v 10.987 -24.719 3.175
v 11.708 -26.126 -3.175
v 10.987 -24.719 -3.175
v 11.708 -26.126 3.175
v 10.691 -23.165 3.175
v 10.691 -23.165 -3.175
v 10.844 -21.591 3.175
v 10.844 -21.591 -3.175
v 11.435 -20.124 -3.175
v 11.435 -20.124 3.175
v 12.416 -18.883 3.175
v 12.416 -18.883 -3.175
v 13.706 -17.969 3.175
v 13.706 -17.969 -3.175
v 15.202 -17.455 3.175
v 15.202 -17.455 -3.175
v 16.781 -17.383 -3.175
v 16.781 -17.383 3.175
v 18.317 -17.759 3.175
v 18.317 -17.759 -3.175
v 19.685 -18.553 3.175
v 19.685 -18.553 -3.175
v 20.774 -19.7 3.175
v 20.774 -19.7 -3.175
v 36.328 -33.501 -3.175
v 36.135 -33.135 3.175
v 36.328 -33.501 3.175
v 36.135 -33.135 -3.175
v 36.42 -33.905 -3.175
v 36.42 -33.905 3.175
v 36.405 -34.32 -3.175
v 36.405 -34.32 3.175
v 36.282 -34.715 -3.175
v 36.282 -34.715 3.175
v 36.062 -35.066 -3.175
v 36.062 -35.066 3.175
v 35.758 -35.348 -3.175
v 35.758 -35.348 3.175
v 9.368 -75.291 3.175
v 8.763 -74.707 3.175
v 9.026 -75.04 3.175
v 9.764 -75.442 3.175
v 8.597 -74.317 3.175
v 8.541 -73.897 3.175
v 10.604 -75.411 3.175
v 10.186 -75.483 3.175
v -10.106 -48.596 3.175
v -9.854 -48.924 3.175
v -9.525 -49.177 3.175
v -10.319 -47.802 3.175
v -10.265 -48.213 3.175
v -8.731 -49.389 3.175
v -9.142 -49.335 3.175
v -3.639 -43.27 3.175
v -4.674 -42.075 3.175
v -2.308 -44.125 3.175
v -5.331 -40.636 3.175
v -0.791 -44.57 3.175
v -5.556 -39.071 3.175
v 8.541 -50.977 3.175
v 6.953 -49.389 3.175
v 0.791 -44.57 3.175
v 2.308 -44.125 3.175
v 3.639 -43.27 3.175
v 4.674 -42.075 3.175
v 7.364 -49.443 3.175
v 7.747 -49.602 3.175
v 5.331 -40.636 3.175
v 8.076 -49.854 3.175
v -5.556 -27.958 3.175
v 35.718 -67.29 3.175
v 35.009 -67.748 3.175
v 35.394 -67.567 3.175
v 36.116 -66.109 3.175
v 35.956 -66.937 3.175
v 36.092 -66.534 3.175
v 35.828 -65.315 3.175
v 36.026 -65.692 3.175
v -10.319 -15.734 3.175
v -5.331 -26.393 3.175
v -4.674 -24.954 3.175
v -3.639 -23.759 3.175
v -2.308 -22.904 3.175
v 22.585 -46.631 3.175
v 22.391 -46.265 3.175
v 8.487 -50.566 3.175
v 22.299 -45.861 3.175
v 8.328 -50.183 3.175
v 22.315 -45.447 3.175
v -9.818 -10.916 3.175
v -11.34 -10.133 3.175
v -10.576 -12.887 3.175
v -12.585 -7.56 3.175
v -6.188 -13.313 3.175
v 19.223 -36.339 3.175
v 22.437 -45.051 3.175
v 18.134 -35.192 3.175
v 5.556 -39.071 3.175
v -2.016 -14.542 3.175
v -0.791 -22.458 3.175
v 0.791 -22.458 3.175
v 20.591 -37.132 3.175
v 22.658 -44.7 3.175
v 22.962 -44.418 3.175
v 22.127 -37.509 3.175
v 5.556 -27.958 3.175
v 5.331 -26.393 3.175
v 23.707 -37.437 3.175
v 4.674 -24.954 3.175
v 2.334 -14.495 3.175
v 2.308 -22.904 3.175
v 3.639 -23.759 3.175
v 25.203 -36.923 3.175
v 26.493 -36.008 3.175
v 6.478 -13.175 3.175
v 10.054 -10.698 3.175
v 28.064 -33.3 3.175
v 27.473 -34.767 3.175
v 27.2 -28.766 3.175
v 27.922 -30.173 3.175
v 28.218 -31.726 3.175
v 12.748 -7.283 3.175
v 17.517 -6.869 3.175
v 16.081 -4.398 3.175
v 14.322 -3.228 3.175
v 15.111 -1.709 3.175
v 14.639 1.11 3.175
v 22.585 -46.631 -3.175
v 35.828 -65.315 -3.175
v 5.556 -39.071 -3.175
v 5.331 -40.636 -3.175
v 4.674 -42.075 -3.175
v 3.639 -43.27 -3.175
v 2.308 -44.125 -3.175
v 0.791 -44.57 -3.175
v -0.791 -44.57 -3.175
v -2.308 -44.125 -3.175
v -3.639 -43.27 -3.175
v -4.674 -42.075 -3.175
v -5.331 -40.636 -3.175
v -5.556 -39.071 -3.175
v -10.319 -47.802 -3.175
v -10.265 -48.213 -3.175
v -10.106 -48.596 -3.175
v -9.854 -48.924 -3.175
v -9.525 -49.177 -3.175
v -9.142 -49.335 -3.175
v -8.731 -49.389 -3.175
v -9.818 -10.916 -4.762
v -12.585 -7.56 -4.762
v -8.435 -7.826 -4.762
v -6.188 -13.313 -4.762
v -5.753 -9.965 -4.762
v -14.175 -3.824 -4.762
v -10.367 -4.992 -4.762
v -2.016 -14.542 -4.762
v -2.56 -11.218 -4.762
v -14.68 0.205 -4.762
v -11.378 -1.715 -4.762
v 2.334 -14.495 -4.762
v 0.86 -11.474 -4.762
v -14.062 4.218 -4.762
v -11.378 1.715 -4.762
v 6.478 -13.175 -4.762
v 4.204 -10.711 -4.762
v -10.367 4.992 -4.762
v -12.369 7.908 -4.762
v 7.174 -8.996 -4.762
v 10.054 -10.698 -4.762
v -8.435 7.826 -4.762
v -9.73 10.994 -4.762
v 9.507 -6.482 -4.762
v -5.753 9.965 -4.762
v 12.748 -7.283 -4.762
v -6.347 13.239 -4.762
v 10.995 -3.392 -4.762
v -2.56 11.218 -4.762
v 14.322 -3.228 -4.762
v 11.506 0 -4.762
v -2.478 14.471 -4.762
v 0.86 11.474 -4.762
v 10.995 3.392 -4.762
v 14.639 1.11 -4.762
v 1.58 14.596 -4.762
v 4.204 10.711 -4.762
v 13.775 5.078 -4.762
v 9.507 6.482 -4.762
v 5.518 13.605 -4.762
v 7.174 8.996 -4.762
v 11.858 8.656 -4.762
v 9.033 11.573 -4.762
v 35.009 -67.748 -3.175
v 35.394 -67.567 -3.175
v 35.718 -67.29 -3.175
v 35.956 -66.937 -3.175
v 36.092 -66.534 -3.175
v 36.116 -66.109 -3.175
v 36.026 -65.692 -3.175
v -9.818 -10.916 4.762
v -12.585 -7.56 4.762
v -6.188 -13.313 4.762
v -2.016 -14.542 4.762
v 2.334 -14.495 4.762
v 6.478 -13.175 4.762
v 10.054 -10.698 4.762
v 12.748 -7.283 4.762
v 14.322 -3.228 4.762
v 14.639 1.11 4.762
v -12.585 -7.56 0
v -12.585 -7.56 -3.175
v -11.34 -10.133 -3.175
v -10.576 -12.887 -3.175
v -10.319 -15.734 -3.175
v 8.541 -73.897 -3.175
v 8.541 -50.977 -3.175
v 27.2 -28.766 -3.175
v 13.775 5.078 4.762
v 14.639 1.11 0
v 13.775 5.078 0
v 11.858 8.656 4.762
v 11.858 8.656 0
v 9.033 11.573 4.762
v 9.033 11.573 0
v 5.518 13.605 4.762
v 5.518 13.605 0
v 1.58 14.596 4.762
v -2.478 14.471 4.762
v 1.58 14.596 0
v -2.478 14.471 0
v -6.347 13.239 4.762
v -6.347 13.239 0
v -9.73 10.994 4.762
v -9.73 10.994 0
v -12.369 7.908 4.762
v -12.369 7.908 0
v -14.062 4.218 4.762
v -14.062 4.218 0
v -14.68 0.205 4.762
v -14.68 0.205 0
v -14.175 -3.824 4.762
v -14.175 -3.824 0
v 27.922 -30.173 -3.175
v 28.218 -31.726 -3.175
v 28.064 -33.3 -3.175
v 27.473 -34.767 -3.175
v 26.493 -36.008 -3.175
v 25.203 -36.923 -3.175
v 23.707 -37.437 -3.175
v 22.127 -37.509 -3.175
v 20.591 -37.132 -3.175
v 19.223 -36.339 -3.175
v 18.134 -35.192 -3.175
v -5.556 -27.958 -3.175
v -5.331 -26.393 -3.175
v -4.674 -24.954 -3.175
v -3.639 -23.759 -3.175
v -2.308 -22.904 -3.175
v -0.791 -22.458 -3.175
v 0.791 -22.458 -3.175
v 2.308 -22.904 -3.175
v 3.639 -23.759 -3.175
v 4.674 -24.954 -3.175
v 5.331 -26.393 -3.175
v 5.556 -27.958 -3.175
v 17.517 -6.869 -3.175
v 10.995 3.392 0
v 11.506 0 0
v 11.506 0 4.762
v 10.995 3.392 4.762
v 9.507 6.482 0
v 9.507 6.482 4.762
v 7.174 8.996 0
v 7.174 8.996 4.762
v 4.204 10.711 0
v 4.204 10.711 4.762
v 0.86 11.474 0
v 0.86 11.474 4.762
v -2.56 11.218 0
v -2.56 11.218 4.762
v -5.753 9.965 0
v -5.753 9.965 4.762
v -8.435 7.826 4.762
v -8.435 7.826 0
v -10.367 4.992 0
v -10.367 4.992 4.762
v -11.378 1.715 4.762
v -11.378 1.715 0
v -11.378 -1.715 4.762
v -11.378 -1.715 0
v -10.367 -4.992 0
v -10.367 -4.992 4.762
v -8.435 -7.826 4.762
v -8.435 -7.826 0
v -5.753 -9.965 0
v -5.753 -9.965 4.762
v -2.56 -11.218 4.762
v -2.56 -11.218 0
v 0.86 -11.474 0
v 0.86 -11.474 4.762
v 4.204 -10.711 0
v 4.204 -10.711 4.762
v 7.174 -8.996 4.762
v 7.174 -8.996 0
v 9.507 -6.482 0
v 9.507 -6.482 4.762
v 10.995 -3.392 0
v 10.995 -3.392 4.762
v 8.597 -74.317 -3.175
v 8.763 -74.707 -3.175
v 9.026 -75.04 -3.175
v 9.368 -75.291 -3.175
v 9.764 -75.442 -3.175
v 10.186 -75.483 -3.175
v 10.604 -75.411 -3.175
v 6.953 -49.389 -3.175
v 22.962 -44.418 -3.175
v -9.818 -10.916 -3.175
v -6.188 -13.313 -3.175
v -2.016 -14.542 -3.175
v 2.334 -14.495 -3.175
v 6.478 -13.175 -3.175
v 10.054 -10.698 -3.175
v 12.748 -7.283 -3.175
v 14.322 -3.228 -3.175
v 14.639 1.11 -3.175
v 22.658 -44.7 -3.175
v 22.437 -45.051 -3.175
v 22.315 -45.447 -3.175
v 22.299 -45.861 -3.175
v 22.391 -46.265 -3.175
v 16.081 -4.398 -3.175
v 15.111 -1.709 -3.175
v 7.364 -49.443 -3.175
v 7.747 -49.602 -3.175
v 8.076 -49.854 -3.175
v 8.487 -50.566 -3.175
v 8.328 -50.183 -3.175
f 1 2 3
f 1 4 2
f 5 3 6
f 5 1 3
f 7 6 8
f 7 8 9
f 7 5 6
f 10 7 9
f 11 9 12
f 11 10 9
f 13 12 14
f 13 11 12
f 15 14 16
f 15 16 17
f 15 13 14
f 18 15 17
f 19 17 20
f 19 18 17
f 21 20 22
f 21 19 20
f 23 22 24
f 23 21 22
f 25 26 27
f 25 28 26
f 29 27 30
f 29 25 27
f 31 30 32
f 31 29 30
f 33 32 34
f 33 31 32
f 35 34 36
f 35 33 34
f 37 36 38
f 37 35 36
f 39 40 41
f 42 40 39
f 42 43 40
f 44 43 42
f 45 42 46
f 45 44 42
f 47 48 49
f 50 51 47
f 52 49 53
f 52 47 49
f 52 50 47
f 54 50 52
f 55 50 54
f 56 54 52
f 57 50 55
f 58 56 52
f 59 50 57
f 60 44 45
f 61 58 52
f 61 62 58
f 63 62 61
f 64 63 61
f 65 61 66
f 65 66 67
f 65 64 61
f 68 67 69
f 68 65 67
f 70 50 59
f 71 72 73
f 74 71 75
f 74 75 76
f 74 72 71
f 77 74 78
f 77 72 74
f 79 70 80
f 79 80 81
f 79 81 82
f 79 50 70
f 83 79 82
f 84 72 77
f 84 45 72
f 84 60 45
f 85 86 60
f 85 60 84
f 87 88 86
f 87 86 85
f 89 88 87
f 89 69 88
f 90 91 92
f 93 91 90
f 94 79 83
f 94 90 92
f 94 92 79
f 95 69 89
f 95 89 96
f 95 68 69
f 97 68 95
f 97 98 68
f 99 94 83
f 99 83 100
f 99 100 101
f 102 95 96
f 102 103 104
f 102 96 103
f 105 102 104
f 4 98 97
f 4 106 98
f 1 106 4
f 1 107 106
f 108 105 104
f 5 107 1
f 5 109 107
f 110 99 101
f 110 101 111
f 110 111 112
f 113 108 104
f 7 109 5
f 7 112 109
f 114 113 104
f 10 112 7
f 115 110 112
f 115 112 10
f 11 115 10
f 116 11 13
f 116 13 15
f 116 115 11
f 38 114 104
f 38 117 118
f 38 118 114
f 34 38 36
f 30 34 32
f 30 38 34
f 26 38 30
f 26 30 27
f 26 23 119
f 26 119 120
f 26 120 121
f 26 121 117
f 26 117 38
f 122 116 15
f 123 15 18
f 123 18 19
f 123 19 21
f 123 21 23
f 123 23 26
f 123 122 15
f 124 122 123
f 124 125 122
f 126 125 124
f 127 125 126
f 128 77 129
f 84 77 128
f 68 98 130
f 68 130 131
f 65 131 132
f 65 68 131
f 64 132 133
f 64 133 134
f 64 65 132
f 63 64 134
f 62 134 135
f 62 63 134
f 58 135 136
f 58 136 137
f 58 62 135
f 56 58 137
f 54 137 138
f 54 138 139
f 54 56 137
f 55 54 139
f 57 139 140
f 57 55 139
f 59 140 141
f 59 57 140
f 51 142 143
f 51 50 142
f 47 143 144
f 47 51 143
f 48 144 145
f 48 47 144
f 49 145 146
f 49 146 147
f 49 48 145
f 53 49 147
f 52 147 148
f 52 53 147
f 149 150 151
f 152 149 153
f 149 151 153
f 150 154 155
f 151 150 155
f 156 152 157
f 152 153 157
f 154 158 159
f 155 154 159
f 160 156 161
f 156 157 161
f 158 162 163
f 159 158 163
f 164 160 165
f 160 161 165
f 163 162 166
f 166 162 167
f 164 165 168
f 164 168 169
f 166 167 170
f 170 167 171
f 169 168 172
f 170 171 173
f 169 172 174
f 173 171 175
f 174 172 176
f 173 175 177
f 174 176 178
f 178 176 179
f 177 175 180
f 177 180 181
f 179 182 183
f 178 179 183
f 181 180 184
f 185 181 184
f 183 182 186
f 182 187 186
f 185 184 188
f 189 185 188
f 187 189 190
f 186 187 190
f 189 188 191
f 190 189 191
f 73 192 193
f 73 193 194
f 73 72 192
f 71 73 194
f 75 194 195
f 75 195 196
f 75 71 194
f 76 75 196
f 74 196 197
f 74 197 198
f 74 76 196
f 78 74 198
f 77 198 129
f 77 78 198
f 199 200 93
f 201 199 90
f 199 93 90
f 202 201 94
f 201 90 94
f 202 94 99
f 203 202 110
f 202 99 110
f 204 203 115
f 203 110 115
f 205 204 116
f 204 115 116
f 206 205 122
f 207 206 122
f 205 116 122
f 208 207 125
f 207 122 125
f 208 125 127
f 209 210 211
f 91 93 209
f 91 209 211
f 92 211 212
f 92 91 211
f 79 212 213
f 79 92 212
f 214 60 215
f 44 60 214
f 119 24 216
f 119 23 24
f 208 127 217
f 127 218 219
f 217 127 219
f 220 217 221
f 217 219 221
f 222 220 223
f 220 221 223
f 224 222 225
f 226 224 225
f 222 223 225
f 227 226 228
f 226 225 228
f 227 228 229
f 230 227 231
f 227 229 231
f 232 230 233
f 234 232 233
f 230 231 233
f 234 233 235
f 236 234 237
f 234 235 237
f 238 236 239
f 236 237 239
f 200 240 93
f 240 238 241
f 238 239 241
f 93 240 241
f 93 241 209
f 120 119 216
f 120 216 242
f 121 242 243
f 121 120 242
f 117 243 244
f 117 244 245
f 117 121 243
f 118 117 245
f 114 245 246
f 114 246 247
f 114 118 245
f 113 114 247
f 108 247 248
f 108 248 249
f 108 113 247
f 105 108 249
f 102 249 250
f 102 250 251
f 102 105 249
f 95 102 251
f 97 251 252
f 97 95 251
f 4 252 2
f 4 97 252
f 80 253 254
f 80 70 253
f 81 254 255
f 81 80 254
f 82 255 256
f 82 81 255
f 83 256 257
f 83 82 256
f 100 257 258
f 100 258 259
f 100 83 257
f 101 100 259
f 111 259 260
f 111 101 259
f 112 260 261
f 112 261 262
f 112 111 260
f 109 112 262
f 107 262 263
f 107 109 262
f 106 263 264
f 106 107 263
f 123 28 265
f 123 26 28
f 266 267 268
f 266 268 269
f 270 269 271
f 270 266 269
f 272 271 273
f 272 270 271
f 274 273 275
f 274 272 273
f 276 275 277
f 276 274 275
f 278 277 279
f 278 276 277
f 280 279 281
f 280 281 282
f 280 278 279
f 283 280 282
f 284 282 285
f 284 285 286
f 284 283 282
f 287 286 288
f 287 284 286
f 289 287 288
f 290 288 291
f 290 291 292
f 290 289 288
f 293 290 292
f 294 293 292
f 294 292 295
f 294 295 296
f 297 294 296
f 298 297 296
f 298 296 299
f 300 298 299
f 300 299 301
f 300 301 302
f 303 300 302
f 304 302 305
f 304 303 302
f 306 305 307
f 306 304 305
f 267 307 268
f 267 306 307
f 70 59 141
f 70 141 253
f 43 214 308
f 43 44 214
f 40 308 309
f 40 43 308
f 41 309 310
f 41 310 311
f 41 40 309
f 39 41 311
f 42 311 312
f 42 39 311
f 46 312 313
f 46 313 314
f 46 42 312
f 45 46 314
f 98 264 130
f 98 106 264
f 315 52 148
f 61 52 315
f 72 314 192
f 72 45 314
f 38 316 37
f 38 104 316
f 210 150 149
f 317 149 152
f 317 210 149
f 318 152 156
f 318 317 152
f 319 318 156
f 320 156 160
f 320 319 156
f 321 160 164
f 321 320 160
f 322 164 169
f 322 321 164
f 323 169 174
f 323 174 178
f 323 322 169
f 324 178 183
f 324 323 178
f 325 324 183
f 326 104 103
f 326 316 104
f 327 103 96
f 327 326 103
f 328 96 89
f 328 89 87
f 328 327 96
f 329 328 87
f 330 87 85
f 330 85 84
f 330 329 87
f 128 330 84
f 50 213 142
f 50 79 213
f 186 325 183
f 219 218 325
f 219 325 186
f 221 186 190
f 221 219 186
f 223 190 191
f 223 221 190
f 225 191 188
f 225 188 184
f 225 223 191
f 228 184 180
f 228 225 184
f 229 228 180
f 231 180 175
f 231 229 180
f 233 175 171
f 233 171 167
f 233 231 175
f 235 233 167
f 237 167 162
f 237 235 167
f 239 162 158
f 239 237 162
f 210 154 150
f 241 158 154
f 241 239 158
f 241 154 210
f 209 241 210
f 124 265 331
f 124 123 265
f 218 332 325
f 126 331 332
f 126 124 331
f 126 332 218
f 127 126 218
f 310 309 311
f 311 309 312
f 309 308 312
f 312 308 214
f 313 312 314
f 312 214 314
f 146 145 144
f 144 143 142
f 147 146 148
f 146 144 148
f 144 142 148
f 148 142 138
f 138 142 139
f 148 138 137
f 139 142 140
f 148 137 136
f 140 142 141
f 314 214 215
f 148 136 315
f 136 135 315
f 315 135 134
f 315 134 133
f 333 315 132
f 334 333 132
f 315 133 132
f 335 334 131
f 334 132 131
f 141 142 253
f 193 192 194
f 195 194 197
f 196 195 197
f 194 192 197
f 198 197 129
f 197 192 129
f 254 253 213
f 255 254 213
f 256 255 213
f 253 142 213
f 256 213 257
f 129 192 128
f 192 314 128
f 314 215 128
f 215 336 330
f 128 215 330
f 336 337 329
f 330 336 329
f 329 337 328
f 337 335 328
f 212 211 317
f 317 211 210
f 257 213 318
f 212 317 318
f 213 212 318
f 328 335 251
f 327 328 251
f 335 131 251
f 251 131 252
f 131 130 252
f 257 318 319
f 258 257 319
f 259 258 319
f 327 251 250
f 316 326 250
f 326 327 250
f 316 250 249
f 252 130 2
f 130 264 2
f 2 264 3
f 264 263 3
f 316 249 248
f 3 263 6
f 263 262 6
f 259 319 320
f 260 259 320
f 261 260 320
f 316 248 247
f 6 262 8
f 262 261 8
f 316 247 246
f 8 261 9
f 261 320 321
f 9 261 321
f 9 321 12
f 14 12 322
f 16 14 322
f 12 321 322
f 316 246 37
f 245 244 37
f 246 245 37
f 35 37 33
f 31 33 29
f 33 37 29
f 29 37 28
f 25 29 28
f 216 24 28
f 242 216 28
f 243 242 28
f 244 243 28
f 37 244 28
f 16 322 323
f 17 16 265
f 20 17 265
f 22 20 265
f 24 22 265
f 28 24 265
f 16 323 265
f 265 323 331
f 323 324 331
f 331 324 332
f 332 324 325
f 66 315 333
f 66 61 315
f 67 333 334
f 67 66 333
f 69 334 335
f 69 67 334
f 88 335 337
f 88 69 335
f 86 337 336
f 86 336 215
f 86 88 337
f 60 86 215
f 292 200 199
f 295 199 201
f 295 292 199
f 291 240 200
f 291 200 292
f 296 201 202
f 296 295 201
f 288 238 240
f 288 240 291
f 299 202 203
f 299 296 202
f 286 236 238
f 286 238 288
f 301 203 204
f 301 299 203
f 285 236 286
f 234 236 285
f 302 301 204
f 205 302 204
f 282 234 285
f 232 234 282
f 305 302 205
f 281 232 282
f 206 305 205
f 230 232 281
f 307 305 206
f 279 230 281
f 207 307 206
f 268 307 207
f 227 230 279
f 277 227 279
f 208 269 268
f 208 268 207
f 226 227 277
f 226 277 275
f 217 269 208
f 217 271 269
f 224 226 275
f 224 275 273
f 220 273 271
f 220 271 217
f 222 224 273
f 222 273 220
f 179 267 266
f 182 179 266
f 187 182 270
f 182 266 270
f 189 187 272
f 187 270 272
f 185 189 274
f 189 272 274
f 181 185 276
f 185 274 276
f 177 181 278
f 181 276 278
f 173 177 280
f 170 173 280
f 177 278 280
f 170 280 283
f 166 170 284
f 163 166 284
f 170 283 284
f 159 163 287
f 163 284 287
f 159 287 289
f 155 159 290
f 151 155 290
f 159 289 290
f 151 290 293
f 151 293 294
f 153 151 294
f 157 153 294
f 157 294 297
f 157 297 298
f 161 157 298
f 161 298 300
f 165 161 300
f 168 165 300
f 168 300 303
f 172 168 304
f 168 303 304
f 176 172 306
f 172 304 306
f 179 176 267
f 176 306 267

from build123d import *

# Parameters (mm, degrees)
SKETCH1_R           = 11.5062
BOSS_EXTRUDE1_DEPTH = 4.7625
BOSS_EXTRUDE2_DEPTH = 3.175
FILLET2_R           = 1.5875


with BuildPart() as part:
    # Sketch1 → Boss-Extrude1 (new body, symmetric)
    with BuildSketch(Plane.XY):
        with BuildLine():
            ThreePointArc((14.639156809, 1.110279863), (-4.45502565, 13.988937769), (-12.585193267, -7.559797873))
            ThreePointArc((-12.585193267, -7.559797873), (4.45502565, -13.988937769), (14.639156809, 1.110279863))
        make_face()
        Circle(SKETCH1_R, mode=Mode.SUBTRACT)
    extrude(amount=BOSS_EXTRUDE1_DEPTH, both=True)

    # Sketch5 → Boss-Extrude2 (add, symmetric)
    with BuildSketch(Plane.XY):
        with BuildLine():
            ThreePointArc((-12.585193267, -7.559797873), (-10.89585042, -11.492870345), (-10.31875, -15.734319794))
            Line((-10.31875, -15.734319794), (-10.31875, -49.389319794))
            Line((-10.31875, -49.389319794), (8.54075, -49.389319794))
            Line((8.54075, -49.389319794), (8.54075, -76.059319794))
            Line((8.54075, -76.059319794), (37.089554297, -67.094446092))
            Line((37.089554297, -67.094446092), (21.666696712, -45.336128971))
            Line((21.666696712, -45.336128971), (37.052935248, -34.429965394))
            Line((37.052935248, -34.429965394), (17.517315641, -6.869430374))
            ThreePointArc((17.517315641, -6.869430374), (15.535368252, -3.075379389), (14.639156809, 1.110279863))
            ThreePointArc((14.639156809, 1.110279863), (4.45502565, -13.988937769), (-12.585193267, -7.559797873))
        make_face()
        with BuildLine():
            ThreePointArc((5.55625, -39.070569794), (0, -44.626819794), (-5.55625, -39.070569794))
            Line((-5.55625, -39.070569794), (-5.55625, -27.958069794))
            ThreePointArc((-5.55625, -27.958069794), (0, -22.401819794), (5.55625, -27.958069794))
            Line((5.55625, -27.958069794), (5.55625, -39.070569794))
        make_face(mode=Mode.SUBTRACT)
        with BuildLine():
            ThreePointArc((27.200344435, -28.7656506), (25.880457031, -36.511728663), (18.134378968, -35.19184126))
            Line((18.134378968, -35.19184126), (11.708188308, -26.125875793))
            ThreePointArc((11.708188308, -26.125875793), (13.028075711, -18.379797729), (20.774153775, -19.699685133))
            Line((20.774153775, -19.699685133), (27.200344435, -28.7656506))
        make_face(mode=Mode.SUBTRACT)
    extrude(amount=BOSS_EXTRUDE2_DEPTH, both=True)

    # Fillet2
    fillet2_edges = [part.edges().sort_by_distance(p)[0] for p in [
        (37.089554297, -67.094446092, 0),
        (21.666696712, -45.336128971, 0),
        (37.052935248, -34.429965394, 0),
        (-10.31875, -49.389319794, 0),
        (8.54075, -49.389319794, 0),
        (8.54075, -76.059319794, 0),
    ]]
    fillet(fillet2_edges, radius=FILLET2_R)


solid = part.part
